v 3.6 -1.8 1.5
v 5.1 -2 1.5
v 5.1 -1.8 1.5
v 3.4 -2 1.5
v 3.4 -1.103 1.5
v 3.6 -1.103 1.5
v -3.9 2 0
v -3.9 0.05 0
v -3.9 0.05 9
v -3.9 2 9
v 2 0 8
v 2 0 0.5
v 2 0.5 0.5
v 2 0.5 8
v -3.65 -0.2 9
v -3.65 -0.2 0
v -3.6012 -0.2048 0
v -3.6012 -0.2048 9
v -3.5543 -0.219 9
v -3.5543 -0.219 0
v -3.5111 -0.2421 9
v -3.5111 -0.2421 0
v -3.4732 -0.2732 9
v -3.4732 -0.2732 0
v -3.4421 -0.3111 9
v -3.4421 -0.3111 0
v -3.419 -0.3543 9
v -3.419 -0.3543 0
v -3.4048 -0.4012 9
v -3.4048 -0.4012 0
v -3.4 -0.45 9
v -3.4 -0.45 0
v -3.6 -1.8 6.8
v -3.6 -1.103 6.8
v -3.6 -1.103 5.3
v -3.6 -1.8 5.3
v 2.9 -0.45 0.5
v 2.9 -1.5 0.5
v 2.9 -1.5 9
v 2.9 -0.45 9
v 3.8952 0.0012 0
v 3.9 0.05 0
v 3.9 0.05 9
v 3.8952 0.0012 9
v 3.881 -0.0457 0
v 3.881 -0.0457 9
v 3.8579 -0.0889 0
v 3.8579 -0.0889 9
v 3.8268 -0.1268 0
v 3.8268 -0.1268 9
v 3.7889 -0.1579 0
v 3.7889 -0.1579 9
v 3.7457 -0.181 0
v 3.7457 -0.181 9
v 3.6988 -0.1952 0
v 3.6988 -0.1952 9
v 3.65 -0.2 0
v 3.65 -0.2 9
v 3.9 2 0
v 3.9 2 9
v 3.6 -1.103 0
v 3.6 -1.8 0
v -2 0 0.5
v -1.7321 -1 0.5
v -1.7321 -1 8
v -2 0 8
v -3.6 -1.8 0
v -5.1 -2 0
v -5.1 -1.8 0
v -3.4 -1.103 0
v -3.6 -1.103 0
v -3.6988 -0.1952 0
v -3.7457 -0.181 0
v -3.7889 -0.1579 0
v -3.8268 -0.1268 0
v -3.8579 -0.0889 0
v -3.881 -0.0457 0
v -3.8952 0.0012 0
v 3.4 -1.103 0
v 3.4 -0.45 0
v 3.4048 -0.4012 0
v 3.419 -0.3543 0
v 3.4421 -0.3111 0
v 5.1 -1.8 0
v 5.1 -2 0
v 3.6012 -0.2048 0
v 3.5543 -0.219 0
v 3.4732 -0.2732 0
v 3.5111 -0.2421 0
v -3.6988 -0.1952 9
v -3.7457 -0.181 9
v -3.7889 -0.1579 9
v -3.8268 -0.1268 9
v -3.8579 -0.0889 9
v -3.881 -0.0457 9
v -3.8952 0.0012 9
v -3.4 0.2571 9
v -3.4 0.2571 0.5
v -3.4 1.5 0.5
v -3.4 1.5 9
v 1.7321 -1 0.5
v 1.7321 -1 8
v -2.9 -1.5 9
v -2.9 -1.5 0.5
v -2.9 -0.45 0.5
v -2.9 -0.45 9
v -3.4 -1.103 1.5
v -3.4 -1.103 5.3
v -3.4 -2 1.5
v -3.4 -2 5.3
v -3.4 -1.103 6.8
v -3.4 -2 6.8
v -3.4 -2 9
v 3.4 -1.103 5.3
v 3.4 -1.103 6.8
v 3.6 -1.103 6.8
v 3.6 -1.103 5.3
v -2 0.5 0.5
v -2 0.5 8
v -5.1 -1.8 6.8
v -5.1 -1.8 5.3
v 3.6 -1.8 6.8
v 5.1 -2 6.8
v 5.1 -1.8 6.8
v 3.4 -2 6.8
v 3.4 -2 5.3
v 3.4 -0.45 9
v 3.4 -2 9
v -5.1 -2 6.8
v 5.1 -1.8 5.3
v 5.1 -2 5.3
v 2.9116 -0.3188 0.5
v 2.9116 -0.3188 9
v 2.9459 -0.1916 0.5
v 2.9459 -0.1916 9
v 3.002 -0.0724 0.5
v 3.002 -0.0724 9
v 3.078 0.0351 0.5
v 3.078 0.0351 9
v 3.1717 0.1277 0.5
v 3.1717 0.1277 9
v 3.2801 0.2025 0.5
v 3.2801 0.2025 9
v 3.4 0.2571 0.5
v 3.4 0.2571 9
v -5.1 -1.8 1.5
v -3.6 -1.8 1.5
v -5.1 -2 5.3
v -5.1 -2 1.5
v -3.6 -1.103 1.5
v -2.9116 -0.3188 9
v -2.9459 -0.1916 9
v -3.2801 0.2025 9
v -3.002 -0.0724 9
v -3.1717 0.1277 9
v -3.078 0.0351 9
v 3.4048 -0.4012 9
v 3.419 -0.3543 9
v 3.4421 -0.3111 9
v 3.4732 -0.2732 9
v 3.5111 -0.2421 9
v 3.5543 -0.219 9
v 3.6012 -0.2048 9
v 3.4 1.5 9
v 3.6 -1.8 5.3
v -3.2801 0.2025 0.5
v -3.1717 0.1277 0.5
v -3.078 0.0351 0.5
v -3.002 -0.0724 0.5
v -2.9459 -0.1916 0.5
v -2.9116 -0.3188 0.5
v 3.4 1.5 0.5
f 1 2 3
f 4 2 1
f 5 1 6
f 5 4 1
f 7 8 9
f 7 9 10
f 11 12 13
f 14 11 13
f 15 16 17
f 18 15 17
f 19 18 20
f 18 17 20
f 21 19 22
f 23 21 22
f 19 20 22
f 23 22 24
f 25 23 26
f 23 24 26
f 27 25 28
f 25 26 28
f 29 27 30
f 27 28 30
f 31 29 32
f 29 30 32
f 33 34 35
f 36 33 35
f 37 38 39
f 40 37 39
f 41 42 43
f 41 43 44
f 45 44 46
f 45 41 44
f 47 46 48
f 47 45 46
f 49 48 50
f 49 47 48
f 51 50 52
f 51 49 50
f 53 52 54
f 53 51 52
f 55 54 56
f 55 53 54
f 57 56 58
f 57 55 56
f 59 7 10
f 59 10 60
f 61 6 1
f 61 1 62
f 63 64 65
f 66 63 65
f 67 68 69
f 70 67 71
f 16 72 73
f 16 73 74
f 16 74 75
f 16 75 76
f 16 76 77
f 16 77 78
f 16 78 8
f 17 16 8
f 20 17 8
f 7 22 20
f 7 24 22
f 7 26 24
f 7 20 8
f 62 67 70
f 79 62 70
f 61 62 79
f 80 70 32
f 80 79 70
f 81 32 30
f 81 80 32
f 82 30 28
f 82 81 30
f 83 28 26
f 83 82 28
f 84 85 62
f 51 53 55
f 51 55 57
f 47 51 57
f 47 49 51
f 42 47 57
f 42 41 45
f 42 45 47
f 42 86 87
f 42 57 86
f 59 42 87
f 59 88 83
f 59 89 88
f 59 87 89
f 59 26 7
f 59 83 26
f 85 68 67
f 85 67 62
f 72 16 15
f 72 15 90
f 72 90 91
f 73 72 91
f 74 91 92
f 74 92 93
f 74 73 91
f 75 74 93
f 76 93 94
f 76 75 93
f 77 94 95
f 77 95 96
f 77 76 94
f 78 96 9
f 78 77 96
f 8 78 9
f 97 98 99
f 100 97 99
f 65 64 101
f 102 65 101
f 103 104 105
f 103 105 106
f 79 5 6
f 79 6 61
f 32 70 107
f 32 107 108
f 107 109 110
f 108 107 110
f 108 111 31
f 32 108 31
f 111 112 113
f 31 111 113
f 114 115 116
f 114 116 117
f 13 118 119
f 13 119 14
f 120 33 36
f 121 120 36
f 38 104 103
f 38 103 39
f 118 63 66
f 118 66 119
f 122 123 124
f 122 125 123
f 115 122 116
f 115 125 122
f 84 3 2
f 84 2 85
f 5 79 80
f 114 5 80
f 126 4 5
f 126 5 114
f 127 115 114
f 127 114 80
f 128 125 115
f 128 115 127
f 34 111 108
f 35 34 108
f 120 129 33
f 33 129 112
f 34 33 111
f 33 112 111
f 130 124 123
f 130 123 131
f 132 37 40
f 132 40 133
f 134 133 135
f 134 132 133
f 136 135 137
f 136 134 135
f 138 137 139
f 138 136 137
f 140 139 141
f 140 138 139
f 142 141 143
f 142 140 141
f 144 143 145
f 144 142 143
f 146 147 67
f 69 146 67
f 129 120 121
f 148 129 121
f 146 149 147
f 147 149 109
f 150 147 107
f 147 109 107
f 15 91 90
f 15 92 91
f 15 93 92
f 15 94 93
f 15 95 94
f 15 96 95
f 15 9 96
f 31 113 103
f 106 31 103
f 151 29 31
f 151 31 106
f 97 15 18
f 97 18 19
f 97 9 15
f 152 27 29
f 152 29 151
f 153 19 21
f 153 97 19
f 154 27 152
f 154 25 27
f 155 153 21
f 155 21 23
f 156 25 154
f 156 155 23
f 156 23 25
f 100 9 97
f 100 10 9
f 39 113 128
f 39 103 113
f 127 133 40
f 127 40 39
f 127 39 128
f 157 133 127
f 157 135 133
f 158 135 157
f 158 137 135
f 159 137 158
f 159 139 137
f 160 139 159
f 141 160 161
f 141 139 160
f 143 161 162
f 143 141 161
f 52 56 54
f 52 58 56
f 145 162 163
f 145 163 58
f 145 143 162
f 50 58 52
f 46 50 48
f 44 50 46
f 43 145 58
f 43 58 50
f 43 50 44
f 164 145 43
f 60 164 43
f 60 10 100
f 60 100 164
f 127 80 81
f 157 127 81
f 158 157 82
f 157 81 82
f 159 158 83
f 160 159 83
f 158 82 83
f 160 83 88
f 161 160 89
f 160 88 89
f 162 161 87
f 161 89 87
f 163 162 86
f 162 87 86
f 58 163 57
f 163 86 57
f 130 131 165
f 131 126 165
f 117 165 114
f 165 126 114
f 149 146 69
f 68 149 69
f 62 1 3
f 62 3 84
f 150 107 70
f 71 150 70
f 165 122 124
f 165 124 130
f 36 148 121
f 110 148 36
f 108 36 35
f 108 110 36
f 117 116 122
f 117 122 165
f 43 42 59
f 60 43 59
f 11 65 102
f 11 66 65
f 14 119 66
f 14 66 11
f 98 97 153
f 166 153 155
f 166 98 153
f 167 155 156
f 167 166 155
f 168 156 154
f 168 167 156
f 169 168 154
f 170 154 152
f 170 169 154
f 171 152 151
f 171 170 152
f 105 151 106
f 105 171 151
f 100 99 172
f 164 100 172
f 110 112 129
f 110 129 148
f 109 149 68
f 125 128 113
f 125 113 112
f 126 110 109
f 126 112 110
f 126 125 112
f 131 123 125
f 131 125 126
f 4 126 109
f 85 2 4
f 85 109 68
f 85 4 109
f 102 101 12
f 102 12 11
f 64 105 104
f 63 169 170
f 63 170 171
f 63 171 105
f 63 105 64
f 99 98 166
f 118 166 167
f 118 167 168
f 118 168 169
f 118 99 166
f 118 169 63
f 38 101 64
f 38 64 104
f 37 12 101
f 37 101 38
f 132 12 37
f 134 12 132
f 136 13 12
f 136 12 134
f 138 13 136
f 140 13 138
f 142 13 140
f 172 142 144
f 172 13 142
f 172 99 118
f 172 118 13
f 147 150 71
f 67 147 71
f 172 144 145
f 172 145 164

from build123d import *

# Parameters (mm, degrees)
SKETCH_1_W          = 7.8
SKETCH_1_H          = 4
EXTRUDE_1_DEPTH     = 9
SKETCH_2_W          = 0.5
SKETCH_2_H          = 9
CUT_EXTRUDE_1_DEPTH = 1.8
FILLET_START        = -1
FILLET_1_DEPTH      = 11
FILLET_1_2_DEPTH    = 9
SHELL_1_T           = -0.5
SKETCH_3_W          = 4
SKETCH_3_H          = 1.5
EXTRUDE_2_DEPTH     = 7.5
CHAMFER_1_SIZE      = 1
CHAMFER_1_SIZE2     = 0.267949192
CHAMFER_2_SIZE      = 1
CHAMFER_2_SIZE2     = 0.267949192
SKETCH_4_W          = 1.5
SKETCH_4_H          = 0.896951392
EXTRUDE_3_DEPTH     = 0.2
SKETCH_5_W          = 1.5
SKETCH_5_H          = 0.2
EXTRUDE_4_DEPTH     = 1.5


with BuildPart() as part:
    # 草图1 → 拉伸1 (new body)
    with BuildSketch(Plane.XY):
        Rectangle(SKETCH_1_W, SKETCH_1_H)
    extrude(amount=EXTRUDE_1_DEPTH)

    # 草图2 → 切除-拉伸1 (cut)
    with BuildSketch(Plane.XZ.offset(2)):
        with Locations((-3.65, 4.5)):
            Rectangle(SKETCH_2_W, SKETCH_2_H)
        with Locations((3.65, 4.5)):
            Rectangle(SKETCH_2_W, SKETCH_2_H)
    extrude(amount=-CUT_EXTRUDE_1_DEPTH, mode=Mode.SUBTRACT)

    # 圆角1: read off the stored shape, not the designer's step
    # 圆角1 outline → 圆角1 (cut)
    with BuildSketch(Plane.XY.offset(FILLET_START)):
        with BuildLine():
            ThreePointArc((3.9, 0.05), (3.826776695, -0.126776695), (3.65, -0.2))
            Line((3.65, -0.2), (3.9, -0.2))
            Line((3.9, -0.2), (3.9, 0.05))
        make_face()
        with BuildLine():
            ThreePointArc((-3.65, -0.2), (-3.826776695, -0.126776695), (-3.9, 0.05))
            Line((-3.9, 0.05), (-3.9, -0.2))
            Line((-3.9, -0.2), (-3.65, -0.2))
        make_face()
    extrude(amount=FILLET_1_DEPTH, mode=Mode.SUBTRACT)

    # Fillet 1 2 outline → Fillet 1 2 (add)
    with BuildSketch(Plane.XY):
        with BuildLine():
            Line((3.4, -0.2), (3.4, -0.45))
            ThreePointArc((3.4, -0.45), (3.473223305, -0.273223305), (3.65, -0.2))
            Line((3.65, -0.2), (3.4, -0.2))
        make_face()
        with BuildLine():
            Line((-3.4, -0.2), (-3.65, -0.2))
            ThreePointArc((-3.65, -0.2), (-3.473223305, -0.273223305), (-3.4, -0.45))
            Line((-3.4, -0.45), (-3.4, -0.2))
        make_face()
    extrude(amount=FILLET_1_2_DEPTH)

    # 抽壳1
    shell_1_openings = [part.faces().sort_by_distance(p)[0] for p in [
        (0, 0.067245036, 9),
    ]]
    offset(amount=SHELL_1_T, openings=shell_1_openings, kind=Kind.INTERSECTION)

    # 草图3 → 拉伸2 (add)
    with BuildSketch(Plane.XY.offset(0.5)):
        with Locations((0, -0.25)):
            Rectangle(SKETCH_3_W, SKETCH_3_H)
    extrude(amount=EXTRUDE_2_DEPTH)

    # 倒角1
    chamfer_1_edges = [part.edges().sort_by_distance(p)[0] for p in [
        (-2, -1, 4.25),
    ]]
    chamfer_1_side = [part.faces().sort_by_distance(p)[0] for p in [
        (-2, -0.25, 4.25),
    ]]
    chamfer(chamfer_1_edges, length=CHAMFER_1_SIZE, length2=CHAMFER_1_SIZE2, reference=chamfer_1_side[0])

    # 倒角2
    chamfer_2_edges = [part.edges().sort_by_distance(p)[0] for p in [
        (2, -1, 4.25),
    ]]
    chamfer_2_side = [part.faces().sort_by_distance(p)[0] for p in [
        (2, -0.25, 4.25),
    ]]
    chamfer(chamfer_2_edges, length=CHAMFER_2_SIZE, length2=CHAMFER_2_SIZE2, reference=chamfer_2_side[0])

    # 草图4 → 拉伸3 (add)
    with BuildSketch(Plane(origin=(3.4, 0, 0), x_dir=(0, 0, -1), z_dir=(1, 0, 0))):
        with Locations((-6.05, -1.551524304)):
            Rectangle(SKETCH_4_W, SKETCH_4_H)
        with Locations((-0.75, -1.551524304)):
            Rectangle(SKETCH_4_W, SKETCH_4_H)
    extrude_3 = extrude(amount=EXTRUDE_3_DEPTH)

    # 镜向1: 拉伸3 across plane
    add(extrude_3.mirror(Plane(origin=(0, 0, 0), x_dir=(0, 0, 1), z_dir=(1, 0, 0))))

    # 草图5 → 拉伸4 (add)
    with BuildSketch(Plane(origin=(3.6, 0, 0), x_dir=(0, 0, -1), z_dir=(1, 0, 0))):
        with Locations((-6.05, -1.9)):
            Rectangle(SKETCH_5_W, SKETCH_5_H)
        with Locations((-0.75, -1.9)):
            Rectangle(SKETCH_5_W, SKETCH_5_H)
    extrude_4 = extrude(amount=EXTRUDE_4_DEPTH)

    # 镜向2: 拉伸4 across plane
    add(extrude_4.mirror(Plane(origin=(0, 0, 0), x_dir=(0, 0, 1), z_dir=(1, 0, 0))))


solid = part.part
